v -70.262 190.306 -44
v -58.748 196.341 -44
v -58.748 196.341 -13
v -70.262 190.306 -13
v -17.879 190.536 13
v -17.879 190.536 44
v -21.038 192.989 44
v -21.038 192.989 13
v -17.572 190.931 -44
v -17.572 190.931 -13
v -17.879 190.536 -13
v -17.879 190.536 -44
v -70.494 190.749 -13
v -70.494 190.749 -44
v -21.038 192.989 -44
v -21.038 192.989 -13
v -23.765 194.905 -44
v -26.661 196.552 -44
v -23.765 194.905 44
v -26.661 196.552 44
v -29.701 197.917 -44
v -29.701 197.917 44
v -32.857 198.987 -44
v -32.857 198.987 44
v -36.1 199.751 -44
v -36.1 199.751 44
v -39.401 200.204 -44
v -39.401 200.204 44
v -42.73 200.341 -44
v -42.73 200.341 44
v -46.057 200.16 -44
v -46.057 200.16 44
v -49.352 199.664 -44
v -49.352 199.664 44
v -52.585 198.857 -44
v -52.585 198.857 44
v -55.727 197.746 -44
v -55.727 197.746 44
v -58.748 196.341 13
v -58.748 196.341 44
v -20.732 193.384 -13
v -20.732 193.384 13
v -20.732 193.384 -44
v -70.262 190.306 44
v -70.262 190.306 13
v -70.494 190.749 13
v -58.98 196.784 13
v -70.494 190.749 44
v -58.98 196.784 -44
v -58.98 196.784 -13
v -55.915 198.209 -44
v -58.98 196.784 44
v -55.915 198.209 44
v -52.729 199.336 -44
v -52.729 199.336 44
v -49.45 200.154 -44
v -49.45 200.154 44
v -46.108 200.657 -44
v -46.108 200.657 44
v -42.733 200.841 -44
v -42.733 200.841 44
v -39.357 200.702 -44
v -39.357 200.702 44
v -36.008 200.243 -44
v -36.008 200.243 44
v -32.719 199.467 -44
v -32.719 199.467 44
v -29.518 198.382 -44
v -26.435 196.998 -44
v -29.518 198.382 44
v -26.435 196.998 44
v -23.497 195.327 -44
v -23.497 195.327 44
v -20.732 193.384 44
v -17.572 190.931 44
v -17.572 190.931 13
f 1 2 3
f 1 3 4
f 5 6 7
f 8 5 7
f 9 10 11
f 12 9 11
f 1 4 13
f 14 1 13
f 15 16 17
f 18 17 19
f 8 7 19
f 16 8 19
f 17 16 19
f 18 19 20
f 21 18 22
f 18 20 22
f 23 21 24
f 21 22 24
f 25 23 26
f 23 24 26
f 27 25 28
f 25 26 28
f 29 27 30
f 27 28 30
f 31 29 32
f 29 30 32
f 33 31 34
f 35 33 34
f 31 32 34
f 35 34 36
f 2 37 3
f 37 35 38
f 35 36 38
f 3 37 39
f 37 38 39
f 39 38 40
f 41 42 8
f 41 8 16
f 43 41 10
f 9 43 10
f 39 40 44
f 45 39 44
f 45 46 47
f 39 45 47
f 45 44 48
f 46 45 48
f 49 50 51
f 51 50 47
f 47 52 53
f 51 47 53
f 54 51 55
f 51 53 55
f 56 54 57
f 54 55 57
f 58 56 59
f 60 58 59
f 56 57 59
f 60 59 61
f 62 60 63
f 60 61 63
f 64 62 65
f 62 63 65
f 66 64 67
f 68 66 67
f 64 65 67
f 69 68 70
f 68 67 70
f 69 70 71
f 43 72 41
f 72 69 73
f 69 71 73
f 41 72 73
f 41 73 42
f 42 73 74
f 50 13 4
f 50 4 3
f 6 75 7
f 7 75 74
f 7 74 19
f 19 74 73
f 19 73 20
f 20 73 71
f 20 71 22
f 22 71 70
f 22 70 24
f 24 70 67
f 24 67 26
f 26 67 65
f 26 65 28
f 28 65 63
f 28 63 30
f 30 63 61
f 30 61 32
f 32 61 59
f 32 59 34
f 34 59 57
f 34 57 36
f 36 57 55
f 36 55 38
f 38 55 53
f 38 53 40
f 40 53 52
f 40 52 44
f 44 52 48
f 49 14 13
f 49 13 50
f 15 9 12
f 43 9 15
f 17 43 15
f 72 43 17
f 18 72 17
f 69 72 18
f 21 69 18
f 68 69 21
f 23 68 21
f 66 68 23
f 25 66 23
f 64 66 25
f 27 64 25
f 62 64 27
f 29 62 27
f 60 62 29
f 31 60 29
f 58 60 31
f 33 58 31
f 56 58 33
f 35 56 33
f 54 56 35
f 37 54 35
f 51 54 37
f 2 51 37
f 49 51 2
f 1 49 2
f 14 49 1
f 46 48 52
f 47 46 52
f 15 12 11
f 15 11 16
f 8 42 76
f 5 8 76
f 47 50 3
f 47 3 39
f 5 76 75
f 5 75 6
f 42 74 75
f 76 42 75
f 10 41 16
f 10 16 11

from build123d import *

# Parameters (mm, degrees)
EXTRUDE_THIN1_DEPTH     = 44
CUT_EXTRUDE1_REACH      = 92.628
SKETCH2_W               = 26
SKETCH2_H               = 13
CUT_EXTRUDE2_REACH      = 187.812
CUT_EXTRUDE2_END_RADIUS = 35
SKETCH3_W               = 4
SKETCH3_H               = 26


with BuildPart() as part:
    # Sketch1 → Extrude-Thin1 (new, symmetric)
    with BuildSketch(Plane.XY):
        with BuildLine():
            Line((-17.878642875, 190.536325772), (-21.038388075, 192.989081421))
            ThreePointArc((-21.038388075, 192.989081421), (-39.400871452, 200.203832377), (-58.748076809, 196.341310922))
            Line((-58.748076809, 196.341310922), (-70.262362524, 190.306310964))
            Line((-70.262362524, 190.306310964), (-70.494477907, 190.749168107))
            Line((-70.494477907, 190.749168107), (-58.980192192, 196.784168064))
            ThreePointArc((-58.980192192, 196.784168064), (-39.356598187, 200.701868398), (-20.731793619, 193.384049571))
            Line((-20.731793619, 193.384049571), (-17.572048419, 190.931293922))
            Line((-17.572048419, 190.931293922), (-17.878642875, 190.536325772))
        make_face()
    extrude(amount=EXTRUDE_THIN1_DEPTH, both=True)

    # Sketch2 → Cut-Extrude1 (cut, up to next)
    with BuildSketch(Plane(origin=(-93.623725178, 178.62640081, 0), x_dir=(0, 0, 1), z_dir=(-0.46423076597919966, 0.8857142857142849, 0)), mode=Mode.PRIVATE) as cut_extrude1_sk1:
        with Locations((0, 32.613666274)):
            Rectangle(SKETCH2_W, SKETCH2_H)
    cut_extrude1_tool1 = extrude(cut_extrude1_sk1.sketch, amount=-CUT_EXTRUDE1_REACH, mode=Mode.PRIVATE) & part.part
    add(cut_extrude1_tool1.solids().sort_by_distance((-64.737335, 193.766668, 0))[0], mode=Mode.SUBTRACT)

    # Cut-Extrude2: up to this cylinder (the profile starts outside it)
    cut_extrude2_end = Plane(origin=(-42.5, 165.341310922, 0), z_dir=(0, 0, -1)) * Cylinder(CUT_EXTRUDE2_END_RADIUS, 446.624, mode=Mode.PRIVATE)
    # Sketch3 → Cut-Extrude2 (cut, up to the surface)
    with BuildSketch(Plane(origin=(85.876233117, 110.62945285, 0), x_dir=(0.7899362999787406, -0.6131889121436371, 0), z_dir=(0.6131889121436371, 0.7899362999787406, 0)), mode=Mode.PRIVATE) as cut_extrude2_sk1:
        with Locations((-132.957751326, 0)):
            Rectangle(SKETCH3_W, SKETCH3_H)
    cut_extrude2_tool1 = extrude(cut_extrude2_sk1.sketch, amount=-CUT_EXTRUDE2_REACH, mode=Mode.PRIVATE) - cut_extrude2_end
    add(cut_extrude2_tool1.solids().sort_by_distance((-19.151921, 192.157672, 0))[0], mode=Mode.SUBTRACT)


solid = part.part
